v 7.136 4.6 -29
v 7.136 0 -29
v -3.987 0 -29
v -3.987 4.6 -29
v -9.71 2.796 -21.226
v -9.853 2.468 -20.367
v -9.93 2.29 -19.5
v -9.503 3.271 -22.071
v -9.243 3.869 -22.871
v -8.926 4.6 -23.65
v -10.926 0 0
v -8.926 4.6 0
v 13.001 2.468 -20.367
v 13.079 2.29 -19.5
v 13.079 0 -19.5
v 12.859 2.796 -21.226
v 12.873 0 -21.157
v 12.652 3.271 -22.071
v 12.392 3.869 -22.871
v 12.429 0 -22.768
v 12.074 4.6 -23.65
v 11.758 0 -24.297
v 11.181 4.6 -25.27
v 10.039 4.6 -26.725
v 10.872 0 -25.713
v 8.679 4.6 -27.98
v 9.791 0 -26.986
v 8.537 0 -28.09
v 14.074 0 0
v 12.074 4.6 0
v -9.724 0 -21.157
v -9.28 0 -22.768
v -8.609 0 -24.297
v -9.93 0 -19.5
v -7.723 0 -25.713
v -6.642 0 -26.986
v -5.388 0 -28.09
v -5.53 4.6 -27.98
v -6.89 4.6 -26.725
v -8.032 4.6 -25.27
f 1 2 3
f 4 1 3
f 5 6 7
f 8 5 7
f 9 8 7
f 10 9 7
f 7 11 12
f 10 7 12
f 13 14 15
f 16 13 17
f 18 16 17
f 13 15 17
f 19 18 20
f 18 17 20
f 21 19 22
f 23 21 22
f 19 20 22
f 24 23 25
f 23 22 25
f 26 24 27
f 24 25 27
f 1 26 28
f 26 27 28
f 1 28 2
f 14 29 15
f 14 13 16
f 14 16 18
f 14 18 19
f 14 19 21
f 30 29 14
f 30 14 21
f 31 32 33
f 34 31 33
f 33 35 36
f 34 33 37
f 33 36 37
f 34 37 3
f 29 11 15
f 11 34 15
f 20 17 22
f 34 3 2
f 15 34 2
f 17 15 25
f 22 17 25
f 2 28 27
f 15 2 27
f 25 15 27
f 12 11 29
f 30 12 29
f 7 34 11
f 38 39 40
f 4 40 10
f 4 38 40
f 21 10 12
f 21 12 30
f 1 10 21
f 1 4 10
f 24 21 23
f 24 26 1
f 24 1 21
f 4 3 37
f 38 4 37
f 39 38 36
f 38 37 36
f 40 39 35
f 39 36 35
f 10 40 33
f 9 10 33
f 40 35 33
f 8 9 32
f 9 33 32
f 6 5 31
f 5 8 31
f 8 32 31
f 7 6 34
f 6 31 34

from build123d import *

# Parameters (mm, degrees)
EXTRUDE_1_DEPTH     = 4.6
CUT_EXTRUDE_1_DEPTH = 33.561472769


with BuildPart() as part:
    # 草图1 → 凸台-拉伸1 (new body)
    with BuildSketch(Plane(origin=(0, 0, 0), x_dir=(1, 0, 0), z_dir=(0, 1, 0))):
        with BuildLine():
            Line((-10.925572519, 0), (14.074427481, 0))
            Line((14.074427481, 0), (13.078683741, 19.499891752))
            ThreePointArc((13.078683741, 19.499891752), (11.340488735, 25.021206932), (7.136270744, 29))
            Line((7.136270744, 29), (-3.987415782, 29))
            ThreePointArc((-3.987415782, 29), (-8.191633773, 25.021206932), (-9.929828779, 19.499891752))
            Line((-9.929828779, 19.499891752), (-10.925572519, 0))
        make_face()
    extrude(amount=EXTRUDE_1_DEPTH)

    # 草图6 → 切除-拉伸1 (cut, through all)
    with BuildSketch(Plane.XY):
        Polygon((-10.925572519, 0), (-8.925572519, 4.6), (-10.925572519, 4.6), align=None)
        Polygon((12.074427481, 4.6), (14.074427481, 4.6), (14.074427481, 0), align=None)
    extrude(amount=-CUT_EXTRUDE_1_DEPTH, mode=Mode.SUBTRACT)


solid = part.part
